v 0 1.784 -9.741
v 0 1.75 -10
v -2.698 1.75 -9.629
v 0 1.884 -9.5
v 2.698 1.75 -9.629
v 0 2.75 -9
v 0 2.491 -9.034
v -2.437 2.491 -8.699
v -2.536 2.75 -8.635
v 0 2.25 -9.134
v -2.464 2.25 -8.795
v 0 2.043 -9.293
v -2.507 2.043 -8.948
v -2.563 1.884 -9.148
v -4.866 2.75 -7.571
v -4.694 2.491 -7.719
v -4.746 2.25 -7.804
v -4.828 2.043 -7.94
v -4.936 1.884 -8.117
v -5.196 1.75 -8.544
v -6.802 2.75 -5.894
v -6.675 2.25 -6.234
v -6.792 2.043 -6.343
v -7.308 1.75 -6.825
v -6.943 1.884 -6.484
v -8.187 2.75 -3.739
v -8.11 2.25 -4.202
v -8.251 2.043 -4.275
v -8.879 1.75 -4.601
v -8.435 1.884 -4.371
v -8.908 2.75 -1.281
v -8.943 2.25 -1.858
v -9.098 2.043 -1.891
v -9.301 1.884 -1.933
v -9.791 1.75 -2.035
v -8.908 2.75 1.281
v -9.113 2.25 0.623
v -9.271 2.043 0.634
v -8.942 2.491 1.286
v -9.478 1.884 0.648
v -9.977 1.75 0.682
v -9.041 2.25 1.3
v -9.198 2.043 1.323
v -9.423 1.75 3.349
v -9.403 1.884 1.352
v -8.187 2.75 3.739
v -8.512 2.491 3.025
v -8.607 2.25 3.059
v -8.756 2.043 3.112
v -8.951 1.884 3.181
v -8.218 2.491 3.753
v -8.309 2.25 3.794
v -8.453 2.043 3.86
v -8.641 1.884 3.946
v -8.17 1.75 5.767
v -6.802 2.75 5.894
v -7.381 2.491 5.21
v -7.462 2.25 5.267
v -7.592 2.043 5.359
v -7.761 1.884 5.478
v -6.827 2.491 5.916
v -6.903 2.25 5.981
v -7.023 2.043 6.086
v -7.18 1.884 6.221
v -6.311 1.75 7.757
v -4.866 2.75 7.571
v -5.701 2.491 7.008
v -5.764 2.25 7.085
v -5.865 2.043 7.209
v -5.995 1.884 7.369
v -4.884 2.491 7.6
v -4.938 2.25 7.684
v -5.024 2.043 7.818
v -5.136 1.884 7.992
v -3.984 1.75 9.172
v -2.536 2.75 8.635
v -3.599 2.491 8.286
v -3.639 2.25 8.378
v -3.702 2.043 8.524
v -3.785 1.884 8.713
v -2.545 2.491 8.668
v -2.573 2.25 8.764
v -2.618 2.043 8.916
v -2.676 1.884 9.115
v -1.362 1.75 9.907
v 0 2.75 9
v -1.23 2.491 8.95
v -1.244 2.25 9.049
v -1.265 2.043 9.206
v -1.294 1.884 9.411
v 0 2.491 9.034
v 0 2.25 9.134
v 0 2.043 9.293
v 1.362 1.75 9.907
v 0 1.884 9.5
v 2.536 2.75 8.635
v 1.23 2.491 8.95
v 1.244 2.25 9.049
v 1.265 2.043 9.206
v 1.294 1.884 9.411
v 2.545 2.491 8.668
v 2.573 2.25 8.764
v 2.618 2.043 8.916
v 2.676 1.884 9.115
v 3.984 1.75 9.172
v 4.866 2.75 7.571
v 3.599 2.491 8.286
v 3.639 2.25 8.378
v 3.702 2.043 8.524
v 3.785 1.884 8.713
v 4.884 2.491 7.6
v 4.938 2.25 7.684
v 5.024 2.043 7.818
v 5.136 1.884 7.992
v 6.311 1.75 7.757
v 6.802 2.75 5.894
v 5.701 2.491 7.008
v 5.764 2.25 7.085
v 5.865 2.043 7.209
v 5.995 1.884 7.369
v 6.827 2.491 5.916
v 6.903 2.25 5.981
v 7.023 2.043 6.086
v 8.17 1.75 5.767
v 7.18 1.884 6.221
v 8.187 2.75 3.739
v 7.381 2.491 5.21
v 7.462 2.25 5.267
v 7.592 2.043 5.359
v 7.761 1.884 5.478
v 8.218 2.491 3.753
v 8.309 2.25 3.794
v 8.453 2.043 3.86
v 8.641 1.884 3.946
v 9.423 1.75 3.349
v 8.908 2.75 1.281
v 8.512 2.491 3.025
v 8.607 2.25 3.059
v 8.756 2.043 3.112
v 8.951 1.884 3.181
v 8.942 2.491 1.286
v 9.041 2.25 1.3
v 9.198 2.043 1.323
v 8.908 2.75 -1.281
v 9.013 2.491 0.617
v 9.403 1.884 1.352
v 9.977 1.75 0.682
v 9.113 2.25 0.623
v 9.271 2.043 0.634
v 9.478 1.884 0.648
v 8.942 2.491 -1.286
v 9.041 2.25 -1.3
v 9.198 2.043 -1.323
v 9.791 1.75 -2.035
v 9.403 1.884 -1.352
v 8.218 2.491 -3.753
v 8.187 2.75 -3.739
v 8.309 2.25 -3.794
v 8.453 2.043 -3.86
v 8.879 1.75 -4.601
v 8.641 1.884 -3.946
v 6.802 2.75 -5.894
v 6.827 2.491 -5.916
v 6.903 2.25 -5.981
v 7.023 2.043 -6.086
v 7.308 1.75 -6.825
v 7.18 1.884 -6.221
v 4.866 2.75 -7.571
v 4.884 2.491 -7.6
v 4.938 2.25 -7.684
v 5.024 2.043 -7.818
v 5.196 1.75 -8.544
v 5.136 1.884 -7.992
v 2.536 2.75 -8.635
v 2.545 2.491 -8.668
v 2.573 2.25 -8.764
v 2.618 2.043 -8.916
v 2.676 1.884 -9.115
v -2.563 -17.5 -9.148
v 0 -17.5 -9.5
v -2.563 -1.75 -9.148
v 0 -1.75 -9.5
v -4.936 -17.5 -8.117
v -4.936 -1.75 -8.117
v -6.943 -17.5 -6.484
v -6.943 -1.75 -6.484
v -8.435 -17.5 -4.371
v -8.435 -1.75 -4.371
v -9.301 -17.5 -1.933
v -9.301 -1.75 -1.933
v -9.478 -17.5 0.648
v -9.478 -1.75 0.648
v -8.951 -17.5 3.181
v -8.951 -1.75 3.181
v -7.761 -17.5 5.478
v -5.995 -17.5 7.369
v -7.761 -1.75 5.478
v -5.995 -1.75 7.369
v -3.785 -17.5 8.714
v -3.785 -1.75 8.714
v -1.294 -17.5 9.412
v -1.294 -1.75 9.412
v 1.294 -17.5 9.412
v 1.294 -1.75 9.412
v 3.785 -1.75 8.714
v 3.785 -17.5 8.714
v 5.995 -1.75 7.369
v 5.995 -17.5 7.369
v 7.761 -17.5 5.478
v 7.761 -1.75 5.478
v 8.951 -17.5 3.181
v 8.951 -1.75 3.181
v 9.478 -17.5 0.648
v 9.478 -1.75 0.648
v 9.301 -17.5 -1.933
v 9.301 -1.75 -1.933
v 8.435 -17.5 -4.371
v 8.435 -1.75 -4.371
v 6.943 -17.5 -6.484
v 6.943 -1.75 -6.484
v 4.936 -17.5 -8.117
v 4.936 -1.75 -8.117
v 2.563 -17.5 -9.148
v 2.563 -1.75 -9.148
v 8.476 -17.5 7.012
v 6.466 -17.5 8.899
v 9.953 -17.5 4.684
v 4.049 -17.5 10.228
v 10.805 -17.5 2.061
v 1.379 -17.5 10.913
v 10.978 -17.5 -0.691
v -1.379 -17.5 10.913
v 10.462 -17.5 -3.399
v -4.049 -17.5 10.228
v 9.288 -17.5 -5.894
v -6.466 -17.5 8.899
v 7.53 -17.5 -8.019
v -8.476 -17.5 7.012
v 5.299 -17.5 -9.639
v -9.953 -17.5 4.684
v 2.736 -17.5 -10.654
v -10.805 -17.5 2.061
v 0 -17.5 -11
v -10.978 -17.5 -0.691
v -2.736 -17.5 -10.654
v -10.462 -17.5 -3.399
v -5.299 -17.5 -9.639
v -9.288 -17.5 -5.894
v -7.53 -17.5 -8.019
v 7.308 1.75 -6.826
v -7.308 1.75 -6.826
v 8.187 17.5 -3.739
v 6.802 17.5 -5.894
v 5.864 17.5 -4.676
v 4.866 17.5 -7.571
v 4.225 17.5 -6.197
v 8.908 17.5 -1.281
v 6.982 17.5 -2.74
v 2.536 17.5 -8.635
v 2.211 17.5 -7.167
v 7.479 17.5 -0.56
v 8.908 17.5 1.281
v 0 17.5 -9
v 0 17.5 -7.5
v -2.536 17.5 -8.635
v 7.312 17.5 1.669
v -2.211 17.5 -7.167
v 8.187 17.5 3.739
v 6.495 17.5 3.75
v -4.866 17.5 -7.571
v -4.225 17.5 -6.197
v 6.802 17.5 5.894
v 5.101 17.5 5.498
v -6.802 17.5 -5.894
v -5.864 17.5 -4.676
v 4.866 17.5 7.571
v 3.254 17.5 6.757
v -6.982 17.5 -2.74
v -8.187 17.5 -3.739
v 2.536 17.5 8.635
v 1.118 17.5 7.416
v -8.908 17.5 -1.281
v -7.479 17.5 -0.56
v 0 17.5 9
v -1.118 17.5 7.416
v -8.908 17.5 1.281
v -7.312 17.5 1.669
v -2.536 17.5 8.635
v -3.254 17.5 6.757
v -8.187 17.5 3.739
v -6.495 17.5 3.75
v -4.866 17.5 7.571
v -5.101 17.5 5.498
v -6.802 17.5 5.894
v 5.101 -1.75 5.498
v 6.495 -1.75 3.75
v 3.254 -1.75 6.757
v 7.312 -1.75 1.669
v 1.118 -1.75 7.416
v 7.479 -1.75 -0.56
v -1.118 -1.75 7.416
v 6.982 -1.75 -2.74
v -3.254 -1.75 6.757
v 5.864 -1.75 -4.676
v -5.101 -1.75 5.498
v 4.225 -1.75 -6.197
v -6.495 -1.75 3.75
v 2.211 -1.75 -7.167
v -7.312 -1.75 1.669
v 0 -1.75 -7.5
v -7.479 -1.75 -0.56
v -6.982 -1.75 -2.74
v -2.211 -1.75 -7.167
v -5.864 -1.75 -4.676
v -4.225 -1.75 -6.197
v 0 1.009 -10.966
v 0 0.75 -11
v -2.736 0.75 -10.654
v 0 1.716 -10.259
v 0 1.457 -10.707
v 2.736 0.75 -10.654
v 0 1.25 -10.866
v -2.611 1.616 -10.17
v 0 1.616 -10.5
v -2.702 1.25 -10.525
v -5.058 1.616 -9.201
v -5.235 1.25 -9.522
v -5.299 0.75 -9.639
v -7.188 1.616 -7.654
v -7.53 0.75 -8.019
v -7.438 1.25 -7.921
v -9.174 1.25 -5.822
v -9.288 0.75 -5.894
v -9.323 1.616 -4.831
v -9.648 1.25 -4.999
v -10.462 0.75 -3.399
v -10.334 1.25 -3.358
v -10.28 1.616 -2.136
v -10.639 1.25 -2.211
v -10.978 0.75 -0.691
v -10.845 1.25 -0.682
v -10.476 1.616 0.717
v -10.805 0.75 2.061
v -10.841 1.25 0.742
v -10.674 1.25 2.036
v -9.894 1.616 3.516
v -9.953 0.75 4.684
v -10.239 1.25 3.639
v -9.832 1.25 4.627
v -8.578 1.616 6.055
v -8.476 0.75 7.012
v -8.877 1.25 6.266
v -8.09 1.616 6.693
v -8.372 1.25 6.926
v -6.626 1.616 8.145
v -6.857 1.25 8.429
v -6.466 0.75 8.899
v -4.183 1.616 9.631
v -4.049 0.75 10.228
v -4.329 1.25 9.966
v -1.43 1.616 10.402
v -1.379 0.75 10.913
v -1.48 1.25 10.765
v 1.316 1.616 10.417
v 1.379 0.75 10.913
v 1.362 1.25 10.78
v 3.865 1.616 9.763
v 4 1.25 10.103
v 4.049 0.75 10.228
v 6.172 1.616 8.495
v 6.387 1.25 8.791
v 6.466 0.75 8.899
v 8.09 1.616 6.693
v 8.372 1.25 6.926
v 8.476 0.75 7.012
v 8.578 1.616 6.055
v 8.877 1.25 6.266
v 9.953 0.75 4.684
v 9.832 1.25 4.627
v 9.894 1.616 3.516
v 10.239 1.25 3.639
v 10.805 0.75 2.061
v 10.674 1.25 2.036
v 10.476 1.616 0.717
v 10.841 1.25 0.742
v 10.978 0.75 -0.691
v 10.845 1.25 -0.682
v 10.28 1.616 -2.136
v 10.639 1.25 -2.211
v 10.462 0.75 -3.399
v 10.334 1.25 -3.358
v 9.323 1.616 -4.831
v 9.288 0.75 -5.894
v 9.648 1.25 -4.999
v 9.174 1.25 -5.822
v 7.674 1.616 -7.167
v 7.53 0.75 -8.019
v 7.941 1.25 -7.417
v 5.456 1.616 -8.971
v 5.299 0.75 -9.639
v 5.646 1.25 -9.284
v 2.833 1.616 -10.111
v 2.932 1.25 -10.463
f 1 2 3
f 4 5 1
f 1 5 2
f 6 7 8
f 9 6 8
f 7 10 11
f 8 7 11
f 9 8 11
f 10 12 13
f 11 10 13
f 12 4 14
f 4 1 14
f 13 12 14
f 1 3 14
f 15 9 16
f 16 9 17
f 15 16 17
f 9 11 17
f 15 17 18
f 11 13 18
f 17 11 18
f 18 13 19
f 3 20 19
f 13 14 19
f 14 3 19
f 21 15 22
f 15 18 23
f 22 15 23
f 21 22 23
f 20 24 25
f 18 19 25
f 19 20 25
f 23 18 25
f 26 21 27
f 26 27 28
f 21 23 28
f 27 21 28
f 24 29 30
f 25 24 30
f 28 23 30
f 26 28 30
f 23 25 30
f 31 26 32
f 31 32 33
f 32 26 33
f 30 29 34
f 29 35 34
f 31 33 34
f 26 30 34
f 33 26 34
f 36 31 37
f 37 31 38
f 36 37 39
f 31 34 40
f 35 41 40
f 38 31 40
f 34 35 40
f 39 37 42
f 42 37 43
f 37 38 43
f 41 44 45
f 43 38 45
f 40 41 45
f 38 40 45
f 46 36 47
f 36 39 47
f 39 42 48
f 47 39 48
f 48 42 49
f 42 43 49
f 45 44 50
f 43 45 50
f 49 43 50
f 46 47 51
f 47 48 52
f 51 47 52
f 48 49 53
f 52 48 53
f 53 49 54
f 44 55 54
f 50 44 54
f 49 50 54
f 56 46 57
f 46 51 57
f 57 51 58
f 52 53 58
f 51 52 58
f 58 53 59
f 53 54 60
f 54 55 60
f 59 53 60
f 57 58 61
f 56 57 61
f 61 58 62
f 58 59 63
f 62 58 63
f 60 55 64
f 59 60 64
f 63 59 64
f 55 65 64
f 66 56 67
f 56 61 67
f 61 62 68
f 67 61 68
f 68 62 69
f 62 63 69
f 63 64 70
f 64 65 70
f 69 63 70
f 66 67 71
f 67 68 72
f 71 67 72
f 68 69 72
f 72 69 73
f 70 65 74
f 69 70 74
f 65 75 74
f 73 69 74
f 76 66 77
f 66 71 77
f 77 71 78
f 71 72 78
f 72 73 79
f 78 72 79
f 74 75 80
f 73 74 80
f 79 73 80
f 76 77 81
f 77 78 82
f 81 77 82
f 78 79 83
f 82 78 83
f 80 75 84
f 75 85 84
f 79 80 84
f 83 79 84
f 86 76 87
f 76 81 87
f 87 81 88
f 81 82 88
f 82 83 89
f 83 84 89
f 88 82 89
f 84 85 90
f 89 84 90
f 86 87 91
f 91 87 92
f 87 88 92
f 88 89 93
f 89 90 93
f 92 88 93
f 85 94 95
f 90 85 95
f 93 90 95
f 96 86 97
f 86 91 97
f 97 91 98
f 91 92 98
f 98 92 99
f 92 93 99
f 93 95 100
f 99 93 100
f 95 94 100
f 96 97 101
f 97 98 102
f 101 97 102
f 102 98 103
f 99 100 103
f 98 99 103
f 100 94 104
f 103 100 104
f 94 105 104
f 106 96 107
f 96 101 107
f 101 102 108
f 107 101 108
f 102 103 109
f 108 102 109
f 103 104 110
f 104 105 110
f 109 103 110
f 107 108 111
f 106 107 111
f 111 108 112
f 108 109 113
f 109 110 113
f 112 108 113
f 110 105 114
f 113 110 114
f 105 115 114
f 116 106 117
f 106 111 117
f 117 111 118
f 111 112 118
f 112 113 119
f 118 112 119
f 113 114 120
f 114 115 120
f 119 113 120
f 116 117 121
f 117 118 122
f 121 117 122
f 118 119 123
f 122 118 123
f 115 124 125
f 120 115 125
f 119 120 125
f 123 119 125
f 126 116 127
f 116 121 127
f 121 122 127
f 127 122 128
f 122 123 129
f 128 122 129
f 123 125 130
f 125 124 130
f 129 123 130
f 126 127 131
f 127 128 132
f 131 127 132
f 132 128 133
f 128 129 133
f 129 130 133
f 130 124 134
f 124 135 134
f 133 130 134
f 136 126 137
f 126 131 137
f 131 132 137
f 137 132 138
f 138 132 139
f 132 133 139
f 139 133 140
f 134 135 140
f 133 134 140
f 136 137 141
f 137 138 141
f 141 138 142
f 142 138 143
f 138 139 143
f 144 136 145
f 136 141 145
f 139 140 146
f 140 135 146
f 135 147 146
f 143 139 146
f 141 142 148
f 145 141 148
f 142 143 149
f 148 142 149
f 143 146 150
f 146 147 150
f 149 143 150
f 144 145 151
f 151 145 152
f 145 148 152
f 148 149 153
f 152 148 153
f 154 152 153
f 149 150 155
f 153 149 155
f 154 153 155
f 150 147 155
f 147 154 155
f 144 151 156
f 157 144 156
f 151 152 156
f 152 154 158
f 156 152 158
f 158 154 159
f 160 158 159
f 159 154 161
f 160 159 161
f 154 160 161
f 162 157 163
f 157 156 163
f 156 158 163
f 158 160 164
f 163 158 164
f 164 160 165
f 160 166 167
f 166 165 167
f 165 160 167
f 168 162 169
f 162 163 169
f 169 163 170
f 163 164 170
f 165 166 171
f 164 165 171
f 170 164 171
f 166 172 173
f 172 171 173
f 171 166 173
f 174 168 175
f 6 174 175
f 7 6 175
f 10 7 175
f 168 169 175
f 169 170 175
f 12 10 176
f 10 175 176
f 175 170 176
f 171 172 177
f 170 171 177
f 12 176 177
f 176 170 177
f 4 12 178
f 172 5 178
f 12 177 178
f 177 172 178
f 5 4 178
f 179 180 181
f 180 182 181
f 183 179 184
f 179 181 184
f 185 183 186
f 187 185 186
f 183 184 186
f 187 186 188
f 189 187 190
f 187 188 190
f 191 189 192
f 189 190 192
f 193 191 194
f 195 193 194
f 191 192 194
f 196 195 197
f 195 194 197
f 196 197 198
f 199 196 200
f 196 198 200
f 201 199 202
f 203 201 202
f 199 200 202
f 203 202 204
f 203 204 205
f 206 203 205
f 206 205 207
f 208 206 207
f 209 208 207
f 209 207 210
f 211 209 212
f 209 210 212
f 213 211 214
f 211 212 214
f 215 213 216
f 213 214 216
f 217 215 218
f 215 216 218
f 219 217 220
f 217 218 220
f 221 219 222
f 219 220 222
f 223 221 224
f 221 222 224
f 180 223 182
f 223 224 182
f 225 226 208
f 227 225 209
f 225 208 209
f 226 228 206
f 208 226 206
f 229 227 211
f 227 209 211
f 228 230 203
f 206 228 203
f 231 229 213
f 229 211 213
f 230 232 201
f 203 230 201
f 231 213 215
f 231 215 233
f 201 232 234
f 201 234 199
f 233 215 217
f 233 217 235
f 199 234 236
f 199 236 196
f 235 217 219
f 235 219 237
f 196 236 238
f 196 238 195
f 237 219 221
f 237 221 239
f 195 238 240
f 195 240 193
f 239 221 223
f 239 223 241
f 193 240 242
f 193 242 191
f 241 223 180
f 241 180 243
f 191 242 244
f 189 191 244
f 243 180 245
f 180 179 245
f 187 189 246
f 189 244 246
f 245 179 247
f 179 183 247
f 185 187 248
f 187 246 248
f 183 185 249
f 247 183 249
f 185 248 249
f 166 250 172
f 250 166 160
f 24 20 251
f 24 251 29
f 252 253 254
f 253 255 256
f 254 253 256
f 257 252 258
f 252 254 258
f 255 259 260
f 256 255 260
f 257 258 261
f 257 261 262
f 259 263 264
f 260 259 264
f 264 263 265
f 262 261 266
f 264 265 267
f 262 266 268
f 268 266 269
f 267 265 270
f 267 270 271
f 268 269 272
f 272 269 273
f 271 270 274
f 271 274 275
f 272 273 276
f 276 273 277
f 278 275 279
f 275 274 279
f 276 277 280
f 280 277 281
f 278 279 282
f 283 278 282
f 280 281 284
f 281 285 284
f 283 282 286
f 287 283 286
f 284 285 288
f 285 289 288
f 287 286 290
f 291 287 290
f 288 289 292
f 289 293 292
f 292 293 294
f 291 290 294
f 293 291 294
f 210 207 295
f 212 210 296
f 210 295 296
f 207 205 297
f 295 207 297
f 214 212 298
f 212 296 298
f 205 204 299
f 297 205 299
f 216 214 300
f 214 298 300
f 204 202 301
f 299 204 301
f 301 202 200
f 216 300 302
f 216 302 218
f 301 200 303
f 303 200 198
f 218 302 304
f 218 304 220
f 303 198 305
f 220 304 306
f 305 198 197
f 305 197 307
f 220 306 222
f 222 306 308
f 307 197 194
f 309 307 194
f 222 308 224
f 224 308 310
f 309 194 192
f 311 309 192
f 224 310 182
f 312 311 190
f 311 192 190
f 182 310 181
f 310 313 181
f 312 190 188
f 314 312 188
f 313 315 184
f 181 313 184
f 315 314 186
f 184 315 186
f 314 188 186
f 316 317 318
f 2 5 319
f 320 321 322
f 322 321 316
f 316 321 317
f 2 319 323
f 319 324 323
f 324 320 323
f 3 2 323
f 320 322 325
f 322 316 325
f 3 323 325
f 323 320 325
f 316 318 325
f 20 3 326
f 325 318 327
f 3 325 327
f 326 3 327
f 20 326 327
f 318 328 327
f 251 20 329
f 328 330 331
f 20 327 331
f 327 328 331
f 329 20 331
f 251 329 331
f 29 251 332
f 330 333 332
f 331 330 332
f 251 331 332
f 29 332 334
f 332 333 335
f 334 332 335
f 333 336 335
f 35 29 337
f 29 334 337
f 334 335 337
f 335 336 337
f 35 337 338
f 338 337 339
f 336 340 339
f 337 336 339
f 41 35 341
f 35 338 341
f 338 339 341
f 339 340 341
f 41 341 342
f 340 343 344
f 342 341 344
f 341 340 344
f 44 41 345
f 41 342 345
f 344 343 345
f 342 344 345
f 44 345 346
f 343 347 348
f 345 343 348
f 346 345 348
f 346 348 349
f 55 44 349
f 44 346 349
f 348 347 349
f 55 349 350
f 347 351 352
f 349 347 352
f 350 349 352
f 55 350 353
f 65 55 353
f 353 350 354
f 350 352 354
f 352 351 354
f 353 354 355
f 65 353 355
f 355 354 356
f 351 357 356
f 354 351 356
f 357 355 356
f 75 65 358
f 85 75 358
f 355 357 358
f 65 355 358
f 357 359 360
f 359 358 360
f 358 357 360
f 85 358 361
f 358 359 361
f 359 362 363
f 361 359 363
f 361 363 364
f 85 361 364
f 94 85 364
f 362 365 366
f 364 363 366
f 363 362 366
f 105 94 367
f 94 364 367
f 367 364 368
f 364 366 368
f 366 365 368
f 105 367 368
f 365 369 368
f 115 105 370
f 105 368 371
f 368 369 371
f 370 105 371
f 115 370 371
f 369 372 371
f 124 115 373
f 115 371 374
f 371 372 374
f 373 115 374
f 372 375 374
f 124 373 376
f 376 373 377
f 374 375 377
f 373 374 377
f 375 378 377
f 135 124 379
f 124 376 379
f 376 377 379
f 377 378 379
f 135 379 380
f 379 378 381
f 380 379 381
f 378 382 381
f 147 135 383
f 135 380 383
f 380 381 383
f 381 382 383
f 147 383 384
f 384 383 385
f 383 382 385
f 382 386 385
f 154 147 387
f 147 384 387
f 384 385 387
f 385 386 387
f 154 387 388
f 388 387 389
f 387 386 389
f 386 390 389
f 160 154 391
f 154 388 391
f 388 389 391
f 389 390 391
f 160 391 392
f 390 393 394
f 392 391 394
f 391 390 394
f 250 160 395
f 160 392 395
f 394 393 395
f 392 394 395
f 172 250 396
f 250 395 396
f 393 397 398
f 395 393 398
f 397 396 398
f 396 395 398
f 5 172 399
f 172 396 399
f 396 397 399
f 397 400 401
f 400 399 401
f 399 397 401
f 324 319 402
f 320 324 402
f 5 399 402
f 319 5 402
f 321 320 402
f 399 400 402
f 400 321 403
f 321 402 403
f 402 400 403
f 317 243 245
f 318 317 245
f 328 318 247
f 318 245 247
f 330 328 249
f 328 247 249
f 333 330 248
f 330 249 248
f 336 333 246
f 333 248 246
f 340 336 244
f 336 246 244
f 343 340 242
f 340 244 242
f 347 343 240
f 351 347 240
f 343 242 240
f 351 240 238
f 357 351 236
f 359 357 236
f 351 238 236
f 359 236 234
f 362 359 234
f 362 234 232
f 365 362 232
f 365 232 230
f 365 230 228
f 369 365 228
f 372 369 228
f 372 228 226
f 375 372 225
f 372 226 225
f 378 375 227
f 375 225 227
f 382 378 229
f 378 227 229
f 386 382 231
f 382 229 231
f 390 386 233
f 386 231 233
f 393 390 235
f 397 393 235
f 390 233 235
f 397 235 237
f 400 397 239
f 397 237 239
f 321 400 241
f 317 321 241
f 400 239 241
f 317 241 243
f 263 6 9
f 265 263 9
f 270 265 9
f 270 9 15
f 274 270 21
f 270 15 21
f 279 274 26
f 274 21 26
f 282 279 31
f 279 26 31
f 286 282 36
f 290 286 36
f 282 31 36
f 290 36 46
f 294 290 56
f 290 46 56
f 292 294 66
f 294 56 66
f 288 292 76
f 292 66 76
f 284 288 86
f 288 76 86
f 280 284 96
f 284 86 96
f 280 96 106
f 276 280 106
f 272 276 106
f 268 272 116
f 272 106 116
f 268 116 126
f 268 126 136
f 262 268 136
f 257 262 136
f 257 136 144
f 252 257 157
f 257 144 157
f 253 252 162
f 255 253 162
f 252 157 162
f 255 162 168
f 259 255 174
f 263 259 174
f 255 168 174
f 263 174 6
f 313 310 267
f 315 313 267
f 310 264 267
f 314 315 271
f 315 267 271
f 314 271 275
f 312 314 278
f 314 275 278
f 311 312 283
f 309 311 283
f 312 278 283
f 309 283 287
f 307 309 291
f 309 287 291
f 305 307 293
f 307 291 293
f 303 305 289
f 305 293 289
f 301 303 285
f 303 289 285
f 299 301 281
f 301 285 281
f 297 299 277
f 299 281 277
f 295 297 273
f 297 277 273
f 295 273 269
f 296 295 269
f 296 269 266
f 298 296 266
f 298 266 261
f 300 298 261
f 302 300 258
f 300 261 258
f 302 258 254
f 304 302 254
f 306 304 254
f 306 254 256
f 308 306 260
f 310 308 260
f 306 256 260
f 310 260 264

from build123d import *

# Parameters (mm, degrees)
FILLET1_R = 1


with BuildPart() as part:
    # Sketch1 → Revolve1 (revolve)
    with BuildSketch(Plane(origin=(0, 0, 0), x_dir=(0, 0, -1), z_dir=(1, 0, 0))):
        Polygon((7.5, 17.5), (9, 17.5), (9, 1.75), (11, 1.75), (11, -17.5), (9.5, -17.5), (9.5, -1.75), (7.5, -1.75), align=None)
    revolve(axis=Axis((0, -17.5, 0), (0, 1, 0)))

    # Fillet1
    fillet1_edges = [part.edges().sort_by_distance(p)[0] for p in [
        (0, 1.75, 11),
        (0, 1.75, 9),
    ]]
    fillet(fillet1_edges, radius=FILLET1_R - 0.0001)  # a hair under: the kernel refuses the full size


solid = part.part
